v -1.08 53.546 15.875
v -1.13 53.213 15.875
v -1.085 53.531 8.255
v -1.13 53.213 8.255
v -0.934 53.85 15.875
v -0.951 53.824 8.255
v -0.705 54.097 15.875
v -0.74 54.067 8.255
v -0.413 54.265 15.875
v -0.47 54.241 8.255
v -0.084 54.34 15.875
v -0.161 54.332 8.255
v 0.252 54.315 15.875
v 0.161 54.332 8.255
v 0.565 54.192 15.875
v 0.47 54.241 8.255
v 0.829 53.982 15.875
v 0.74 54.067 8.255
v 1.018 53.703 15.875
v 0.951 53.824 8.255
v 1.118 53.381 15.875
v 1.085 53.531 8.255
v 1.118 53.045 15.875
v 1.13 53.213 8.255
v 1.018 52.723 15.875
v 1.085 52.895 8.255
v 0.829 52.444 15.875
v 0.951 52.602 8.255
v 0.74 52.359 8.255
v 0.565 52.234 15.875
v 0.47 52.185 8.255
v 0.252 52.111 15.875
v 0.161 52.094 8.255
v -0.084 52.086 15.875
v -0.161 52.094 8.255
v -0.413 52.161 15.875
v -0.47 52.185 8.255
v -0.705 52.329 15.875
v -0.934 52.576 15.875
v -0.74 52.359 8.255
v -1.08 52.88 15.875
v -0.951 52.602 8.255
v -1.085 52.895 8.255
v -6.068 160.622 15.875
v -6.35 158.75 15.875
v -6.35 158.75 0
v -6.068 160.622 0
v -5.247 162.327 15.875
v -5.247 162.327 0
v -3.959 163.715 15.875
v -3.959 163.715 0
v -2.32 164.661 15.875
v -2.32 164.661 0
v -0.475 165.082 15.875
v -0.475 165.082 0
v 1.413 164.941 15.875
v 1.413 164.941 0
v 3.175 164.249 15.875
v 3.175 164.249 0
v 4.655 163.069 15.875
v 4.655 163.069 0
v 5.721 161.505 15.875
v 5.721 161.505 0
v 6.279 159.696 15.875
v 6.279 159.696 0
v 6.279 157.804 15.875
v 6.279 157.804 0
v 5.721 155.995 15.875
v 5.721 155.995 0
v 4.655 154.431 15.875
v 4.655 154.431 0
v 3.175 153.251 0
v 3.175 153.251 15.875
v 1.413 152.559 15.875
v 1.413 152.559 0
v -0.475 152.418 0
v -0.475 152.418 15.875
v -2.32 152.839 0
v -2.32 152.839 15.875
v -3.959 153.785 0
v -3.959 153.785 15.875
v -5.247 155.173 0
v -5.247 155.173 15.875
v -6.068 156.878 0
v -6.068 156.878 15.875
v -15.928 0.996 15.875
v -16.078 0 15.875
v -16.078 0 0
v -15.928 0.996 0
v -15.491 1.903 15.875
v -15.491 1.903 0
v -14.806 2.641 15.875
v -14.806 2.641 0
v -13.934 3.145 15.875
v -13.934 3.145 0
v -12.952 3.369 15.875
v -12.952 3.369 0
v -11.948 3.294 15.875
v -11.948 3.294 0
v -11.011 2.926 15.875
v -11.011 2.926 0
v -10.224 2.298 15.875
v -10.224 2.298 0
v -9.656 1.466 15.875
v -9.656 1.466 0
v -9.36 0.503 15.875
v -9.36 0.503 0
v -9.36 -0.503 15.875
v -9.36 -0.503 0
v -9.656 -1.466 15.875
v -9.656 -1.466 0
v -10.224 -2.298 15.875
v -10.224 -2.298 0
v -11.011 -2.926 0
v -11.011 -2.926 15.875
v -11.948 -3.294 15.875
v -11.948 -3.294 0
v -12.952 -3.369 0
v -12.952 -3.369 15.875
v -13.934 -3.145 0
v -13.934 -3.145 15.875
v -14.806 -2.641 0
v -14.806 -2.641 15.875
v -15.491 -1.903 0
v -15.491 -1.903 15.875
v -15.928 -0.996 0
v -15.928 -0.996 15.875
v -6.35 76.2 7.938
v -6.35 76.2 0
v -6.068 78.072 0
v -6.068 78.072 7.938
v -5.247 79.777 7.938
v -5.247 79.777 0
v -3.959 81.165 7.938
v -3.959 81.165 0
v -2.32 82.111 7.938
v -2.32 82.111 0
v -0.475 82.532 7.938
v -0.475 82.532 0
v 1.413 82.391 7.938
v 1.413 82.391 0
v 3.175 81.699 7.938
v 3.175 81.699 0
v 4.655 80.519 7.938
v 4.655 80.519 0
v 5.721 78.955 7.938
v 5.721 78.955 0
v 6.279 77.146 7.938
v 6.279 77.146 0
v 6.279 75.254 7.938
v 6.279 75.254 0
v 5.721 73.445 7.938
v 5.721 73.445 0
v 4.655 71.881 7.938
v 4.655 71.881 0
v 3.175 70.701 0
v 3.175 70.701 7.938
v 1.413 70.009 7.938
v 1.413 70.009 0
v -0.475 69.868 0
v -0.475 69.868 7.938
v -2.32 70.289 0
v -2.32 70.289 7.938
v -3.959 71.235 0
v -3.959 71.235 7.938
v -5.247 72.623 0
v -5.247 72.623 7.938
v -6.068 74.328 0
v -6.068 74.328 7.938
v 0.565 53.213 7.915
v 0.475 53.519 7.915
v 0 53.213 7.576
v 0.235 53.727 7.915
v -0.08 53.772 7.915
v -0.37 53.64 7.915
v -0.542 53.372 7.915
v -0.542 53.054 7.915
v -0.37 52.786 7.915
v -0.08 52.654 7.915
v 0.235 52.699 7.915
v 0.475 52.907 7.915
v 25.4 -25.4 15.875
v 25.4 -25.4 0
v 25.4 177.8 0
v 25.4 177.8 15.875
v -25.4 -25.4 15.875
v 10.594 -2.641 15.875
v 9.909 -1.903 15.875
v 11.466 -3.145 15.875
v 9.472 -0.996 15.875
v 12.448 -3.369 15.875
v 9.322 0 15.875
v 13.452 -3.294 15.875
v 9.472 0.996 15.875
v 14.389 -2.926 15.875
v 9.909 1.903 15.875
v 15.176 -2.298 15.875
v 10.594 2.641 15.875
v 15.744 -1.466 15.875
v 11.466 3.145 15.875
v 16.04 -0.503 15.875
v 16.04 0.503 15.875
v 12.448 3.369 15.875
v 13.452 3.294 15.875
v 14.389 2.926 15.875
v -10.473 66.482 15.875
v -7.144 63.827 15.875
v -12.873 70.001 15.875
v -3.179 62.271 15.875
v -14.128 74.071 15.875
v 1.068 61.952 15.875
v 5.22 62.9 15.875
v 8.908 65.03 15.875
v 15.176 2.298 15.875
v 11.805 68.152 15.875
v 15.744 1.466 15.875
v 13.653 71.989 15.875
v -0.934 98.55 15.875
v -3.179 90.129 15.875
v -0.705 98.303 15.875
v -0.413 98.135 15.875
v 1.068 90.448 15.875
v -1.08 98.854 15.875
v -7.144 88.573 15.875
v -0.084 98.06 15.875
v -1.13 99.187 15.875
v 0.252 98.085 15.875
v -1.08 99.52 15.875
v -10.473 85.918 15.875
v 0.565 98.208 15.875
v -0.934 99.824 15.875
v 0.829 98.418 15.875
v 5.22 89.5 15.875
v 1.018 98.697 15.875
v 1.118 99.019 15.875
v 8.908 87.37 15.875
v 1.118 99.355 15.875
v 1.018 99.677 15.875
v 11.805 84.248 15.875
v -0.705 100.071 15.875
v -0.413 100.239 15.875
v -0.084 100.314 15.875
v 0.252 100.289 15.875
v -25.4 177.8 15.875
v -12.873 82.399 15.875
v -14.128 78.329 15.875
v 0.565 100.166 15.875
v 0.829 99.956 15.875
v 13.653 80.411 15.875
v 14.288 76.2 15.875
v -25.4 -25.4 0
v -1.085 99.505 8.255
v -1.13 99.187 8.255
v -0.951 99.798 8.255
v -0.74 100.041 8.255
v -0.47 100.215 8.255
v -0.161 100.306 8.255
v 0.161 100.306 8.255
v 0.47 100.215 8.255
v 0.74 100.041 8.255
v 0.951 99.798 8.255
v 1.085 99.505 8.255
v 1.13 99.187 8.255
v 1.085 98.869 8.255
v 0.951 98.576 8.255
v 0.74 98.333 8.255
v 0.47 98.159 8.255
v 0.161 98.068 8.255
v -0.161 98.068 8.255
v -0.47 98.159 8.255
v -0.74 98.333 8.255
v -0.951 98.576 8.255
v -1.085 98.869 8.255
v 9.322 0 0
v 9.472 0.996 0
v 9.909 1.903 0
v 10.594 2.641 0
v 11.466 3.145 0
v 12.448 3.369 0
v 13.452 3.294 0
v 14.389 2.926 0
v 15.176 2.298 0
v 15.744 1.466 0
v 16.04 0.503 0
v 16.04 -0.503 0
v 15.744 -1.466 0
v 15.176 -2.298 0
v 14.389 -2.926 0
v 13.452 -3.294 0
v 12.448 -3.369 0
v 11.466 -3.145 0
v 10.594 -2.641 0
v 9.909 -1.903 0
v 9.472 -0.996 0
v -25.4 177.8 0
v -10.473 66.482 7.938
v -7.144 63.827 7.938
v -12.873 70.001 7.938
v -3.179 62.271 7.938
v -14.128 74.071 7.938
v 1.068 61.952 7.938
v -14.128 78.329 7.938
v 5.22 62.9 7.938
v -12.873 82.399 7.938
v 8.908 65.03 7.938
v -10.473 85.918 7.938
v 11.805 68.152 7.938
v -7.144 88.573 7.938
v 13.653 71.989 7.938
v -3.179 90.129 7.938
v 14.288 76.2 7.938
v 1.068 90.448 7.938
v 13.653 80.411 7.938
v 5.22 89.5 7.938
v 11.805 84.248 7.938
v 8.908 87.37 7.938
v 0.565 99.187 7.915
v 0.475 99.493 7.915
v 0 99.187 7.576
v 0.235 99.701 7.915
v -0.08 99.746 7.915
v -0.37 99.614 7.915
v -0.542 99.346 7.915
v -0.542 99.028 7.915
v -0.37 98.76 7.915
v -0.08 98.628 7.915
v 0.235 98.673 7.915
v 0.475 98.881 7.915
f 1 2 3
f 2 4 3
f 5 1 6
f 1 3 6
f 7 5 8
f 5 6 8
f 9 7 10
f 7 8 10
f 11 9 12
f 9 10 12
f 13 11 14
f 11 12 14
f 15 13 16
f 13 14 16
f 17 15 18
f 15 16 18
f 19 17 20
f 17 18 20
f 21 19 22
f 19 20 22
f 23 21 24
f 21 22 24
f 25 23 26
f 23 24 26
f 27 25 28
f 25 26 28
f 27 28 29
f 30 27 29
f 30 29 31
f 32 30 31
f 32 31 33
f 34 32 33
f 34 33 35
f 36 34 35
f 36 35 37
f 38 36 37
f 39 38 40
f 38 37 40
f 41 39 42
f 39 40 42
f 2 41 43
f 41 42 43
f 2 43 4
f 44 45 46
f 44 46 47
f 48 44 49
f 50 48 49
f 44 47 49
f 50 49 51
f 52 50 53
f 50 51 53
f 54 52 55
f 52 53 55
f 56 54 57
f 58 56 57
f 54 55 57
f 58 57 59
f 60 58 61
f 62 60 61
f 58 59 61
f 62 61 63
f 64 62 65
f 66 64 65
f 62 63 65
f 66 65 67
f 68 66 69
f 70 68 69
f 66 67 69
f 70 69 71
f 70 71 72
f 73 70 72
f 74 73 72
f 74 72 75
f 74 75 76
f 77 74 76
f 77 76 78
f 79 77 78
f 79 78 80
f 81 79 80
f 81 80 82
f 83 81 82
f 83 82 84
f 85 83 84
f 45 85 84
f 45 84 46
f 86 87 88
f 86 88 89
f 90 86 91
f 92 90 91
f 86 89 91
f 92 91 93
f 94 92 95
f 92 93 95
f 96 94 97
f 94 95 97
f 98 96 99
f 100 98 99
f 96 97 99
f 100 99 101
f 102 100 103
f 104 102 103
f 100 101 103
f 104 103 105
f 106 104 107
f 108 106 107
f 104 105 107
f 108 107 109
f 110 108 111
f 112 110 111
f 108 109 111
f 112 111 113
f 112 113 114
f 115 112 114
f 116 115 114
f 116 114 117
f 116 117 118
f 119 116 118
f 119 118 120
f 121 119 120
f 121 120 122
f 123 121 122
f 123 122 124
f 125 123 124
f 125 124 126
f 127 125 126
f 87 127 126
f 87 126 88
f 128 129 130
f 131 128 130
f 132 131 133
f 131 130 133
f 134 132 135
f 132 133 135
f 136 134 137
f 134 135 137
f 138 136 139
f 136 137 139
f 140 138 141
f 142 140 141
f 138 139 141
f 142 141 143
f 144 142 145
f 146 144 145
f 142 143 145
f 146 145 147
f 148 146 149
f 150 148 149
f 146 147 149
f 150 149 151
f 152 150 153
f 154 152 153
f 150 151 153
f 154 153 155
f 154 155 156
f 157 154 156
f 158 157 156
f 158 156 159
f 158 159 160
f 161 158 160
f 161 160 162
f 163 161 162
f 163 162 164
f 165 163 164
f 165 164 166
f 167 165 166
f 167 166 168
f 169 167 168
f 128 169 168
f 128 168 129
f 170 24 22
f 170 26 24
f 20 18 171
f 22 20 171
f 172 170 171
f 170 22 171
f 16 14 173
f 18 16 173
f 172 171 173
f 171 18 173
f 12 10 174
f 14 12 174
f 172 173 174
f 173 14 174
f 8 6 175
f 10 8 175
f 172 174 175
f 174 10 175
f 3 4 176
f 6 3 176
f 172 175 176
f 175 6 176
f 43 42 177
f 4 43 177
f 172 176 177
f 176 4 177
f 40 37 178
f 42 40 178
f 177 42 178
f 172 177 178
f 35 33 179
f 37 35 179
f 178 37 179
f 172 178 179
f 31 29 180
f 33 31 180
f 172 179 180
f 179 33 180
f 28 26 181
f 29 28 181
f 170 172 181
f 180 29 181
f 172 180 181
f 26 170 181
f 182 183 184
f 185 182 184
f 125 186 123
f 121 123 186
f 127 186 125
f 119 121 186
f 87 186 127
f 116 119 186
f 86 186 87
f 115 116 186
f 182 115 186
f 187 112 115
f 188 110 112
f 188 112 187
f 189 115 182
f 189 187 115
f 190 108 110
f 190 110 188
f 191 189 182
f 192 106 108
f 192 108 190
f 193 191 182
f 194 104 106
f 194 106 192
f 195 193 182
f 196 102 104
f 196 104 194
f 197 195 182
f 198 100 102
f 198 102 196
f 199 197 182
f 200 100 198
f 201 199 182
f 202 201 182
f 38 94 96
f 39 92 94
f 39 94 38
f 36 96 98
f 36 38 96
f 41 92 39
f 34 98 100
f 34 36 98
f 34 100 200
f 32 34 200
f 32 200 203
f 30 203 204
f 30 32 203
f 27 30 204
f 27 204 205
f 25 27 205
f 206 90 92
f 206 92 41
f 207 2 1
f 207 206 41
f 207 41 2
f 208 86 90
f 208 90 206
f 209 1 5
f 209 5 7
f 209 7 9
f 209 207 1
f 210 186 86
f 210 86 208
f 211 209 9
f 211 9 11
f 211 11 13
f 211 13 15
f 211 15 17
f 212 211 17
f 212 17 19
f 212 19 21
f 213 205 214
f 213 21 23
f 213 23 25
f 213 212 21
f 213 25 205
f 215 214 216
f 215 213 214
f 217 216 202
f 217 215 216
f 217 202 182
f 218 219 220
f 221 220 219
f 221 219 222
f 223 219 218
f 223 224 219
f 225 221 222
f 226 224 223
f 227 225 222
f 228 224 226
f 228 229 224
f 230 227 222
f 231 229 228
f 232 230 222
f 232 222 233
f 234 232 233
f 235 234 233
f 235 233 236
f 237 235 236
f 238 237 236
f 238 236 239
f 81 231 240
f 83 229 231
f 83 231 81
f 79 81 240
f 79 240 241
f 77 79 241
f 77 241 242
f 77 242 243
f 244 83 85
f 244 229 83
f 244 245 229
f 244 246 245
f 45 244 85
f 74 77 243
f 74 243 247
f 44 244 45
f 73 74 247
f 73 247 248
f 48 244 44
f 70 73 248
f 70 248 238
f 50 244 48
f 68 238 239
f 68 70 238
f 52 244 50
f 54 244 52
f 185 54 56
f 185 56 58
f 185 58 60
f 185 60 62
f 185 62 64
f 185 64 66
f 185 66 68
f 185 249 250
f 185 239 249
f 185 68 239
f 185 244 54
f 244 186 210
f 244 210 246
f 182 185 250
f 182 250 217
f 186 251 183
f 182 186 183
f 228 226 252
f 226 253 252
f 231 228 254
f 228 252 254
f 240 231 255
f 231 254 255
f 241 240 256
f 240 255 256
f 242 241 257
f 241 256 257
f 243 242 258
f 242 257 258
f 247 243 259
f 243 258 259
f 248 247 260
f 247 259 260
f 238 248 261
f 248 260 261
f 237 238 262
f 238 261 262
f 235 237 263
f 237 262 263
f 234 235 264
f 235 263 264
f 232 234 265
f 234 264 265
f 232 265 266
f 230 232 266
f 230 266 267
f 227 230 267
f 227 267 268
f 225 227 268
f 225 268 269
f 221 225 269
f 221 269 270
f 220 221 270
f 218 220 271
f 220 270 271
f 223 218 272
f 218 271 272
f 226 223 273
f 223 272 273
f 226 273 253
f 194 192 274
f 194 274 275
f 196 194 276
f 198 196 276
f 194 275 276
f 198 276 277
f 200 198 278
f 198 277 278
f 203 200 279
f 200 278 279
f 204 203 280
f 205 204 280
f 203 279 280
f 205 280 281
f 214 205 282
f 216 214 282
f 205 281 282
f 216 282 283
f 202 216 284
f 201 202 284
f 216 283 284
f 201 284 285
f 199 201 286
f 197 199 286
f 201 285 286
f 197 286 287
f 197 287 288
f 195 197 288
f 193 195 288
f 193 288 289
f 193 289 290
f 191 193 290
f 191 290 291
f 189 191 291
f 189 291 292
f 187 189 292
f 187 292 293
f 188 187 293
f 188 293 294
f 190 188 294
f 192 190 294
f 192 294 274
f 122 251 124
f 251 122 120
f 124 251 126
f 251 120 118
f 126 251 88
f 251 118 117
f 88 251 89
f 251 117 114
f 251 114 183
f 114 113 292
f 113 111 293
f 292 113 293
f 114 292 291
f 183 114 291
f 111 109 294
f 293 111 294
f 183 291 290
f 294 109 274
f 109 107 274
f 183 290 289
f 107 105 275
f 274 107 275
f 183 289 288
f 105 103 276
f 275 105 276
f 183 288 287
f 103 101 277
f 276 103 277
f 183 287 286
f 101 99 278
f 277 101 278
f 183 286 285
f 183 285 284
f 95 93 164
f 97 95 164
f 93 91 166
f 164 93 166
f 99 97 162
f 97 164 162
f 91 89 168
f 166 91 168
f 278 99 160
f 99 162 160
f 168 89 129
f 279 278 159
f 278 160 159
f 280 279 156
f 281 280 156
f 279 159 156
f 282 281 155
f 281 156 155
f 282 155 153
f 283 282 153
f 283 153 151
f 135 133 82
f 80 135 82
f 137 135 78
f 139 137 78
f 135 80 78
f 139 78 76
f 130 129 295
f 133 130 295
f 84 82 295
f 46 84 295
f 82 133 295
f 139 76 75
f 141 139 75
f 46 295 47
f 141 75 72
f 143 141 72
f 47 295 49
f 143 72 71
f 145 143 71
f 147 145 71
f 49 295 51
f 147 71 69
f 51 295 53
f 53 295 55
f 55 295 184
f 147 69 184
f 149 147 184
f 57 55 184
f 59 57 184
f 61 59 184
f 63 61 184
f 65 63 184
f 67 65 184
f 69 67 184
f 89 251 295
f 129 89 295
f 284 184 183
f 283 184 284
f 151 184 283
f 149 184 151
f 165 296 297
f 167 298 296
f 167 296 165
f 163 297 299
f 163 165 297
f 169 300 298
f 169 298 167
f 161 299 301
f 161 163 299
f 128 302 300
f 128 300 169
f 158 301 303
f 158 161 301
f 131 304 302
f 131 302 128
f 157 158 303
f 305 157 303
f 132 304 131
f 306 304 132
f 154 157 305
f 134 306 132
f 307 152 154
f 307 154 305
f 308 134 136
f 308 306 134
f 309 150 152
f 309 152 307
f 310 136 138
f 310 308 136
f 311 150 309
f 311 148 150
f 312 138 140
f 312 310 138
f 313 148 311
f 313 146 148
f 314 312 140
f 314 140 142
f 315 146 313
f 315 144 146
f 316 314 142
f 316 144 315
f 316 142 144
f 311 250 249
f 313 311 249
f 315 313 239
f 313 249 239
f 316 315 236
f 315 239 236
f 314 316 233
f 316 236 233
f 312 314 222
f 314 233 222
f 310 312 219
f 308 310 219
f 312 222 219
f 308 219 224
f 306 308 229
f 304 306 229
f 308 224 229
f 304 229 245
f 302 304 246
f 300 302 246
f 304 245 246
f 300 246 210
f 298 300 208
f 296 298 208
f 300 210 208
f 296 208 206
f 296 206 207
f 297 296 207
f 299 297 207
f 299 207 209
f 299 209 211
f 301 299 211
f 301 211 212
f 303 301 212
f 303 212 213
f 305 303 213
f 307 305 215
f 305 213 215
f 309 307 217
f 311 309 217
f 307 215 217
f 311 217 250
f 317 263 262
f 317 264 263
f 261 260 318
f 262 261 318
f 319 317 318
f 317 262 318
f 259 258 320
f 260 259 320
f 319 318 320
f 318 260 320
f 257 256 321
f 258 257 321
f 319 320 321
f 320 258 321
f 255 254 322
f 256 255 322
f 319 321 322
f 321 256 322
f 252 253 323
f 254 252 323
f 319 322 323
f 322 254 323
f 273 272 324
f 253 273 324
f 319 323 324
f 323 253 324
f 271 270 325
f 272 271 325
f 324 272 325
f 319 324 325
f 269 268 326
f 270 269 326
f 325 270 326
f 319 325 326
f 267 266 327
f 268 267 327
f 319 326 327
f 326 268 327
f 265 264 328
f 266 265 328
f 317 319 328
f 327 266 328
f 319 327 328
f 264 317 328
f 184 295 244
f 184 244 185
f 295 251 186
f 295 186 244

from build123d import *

# Parameters (mm, degrees)
SKETCH1_W                 = 50.8
SKETCH1_H                 = 203.2
BOSS_EXTRUDE1_DEPTH       = 15.875
F_1_4_CLEARANCE_HOLE1_D   = 6.7564
SKETCH5_R                 = 6.35
CUT_EXTRUDE1_DEPTH        = 16.875
SKETCH6_R                 = 14.2875
CUT_EXTRUDE2_DEPTH        = 7.9375
F_4_40_TAPPED_HOLE1_D     = 2.2606
F_4_40_TAPPED_HOLE1_DEPTH = 7.62
F_4_40_TAPPED_HOLE1_TIP   = 0.679152758


with BuildPart() as part:
    # Sketch1 → Boss-Extrude1 (new body)
    with BuildSketch(Plane.XY):
        with Locations((0, 76.2)):
            Rectangle(SKETCH1_W, SKETCH1_H)
    extrude(amount=BOSS_EXTRUDE1_DEPTH)

    # 1/4 Clearance Hole1 (through all)
    with Locations(Plane.XY.offset(15.875)):
        with Locations((12.7, 0), (-12.7, 0)):
            Hole(F_1_4_CLEARANCE_HOLE1_D / 2)

    # Sketch5 → Cut-Extrude1 (cut, through all)
    with BuildSketch(Plane(origin=(0, 0, 0), x_dir=(-1, 0, 0), z_dir=(0, 0, -1))):
        with Locations((0, 158.75)):
            Circle(SKETCH5_R)
        with Locations((0, 76.2)):
            Circle(SKETCH5_R)
    extrude(amount=-CUT_EXTRUDE1_DEPTH, mode=Mode.SUBTRACT)

    # Sketch6 → Cut-Extrude2 (cut)
    with BuildSketch(Plane.XY.offset(15.875)):
        with Locations((0, 76.2)):
            Circle(SKETCH6_R)
    extrude(amount=-CUT_EXTRUDE2_DEPTH, mode=Mode.SUBTRACT)

    # #4-40 Tapped Hole1
    with Locations(Plane.XY.offset(15.875)):
        with Locations((0, 99.187), (0, 53.213)):
            Hole(F_4_40_TAPPED_HOLE1_D / 2, depth=F_4_40_TAPPED_HOLE1_DEPTH)
            with Locations((0, 0, -(F_4_40_TAPPED_HOLE1_DEPTH + F_4_40_TAPPED_HOLE1_TIP / 2))):  # 118° drill point
                Cone(0, F_4_40_TAPPED_HOLE1_D / 2, F_4_40_TAPPED_HOLE1_TIP, mode=Mode.SUBTRACT)


solid = part.part
